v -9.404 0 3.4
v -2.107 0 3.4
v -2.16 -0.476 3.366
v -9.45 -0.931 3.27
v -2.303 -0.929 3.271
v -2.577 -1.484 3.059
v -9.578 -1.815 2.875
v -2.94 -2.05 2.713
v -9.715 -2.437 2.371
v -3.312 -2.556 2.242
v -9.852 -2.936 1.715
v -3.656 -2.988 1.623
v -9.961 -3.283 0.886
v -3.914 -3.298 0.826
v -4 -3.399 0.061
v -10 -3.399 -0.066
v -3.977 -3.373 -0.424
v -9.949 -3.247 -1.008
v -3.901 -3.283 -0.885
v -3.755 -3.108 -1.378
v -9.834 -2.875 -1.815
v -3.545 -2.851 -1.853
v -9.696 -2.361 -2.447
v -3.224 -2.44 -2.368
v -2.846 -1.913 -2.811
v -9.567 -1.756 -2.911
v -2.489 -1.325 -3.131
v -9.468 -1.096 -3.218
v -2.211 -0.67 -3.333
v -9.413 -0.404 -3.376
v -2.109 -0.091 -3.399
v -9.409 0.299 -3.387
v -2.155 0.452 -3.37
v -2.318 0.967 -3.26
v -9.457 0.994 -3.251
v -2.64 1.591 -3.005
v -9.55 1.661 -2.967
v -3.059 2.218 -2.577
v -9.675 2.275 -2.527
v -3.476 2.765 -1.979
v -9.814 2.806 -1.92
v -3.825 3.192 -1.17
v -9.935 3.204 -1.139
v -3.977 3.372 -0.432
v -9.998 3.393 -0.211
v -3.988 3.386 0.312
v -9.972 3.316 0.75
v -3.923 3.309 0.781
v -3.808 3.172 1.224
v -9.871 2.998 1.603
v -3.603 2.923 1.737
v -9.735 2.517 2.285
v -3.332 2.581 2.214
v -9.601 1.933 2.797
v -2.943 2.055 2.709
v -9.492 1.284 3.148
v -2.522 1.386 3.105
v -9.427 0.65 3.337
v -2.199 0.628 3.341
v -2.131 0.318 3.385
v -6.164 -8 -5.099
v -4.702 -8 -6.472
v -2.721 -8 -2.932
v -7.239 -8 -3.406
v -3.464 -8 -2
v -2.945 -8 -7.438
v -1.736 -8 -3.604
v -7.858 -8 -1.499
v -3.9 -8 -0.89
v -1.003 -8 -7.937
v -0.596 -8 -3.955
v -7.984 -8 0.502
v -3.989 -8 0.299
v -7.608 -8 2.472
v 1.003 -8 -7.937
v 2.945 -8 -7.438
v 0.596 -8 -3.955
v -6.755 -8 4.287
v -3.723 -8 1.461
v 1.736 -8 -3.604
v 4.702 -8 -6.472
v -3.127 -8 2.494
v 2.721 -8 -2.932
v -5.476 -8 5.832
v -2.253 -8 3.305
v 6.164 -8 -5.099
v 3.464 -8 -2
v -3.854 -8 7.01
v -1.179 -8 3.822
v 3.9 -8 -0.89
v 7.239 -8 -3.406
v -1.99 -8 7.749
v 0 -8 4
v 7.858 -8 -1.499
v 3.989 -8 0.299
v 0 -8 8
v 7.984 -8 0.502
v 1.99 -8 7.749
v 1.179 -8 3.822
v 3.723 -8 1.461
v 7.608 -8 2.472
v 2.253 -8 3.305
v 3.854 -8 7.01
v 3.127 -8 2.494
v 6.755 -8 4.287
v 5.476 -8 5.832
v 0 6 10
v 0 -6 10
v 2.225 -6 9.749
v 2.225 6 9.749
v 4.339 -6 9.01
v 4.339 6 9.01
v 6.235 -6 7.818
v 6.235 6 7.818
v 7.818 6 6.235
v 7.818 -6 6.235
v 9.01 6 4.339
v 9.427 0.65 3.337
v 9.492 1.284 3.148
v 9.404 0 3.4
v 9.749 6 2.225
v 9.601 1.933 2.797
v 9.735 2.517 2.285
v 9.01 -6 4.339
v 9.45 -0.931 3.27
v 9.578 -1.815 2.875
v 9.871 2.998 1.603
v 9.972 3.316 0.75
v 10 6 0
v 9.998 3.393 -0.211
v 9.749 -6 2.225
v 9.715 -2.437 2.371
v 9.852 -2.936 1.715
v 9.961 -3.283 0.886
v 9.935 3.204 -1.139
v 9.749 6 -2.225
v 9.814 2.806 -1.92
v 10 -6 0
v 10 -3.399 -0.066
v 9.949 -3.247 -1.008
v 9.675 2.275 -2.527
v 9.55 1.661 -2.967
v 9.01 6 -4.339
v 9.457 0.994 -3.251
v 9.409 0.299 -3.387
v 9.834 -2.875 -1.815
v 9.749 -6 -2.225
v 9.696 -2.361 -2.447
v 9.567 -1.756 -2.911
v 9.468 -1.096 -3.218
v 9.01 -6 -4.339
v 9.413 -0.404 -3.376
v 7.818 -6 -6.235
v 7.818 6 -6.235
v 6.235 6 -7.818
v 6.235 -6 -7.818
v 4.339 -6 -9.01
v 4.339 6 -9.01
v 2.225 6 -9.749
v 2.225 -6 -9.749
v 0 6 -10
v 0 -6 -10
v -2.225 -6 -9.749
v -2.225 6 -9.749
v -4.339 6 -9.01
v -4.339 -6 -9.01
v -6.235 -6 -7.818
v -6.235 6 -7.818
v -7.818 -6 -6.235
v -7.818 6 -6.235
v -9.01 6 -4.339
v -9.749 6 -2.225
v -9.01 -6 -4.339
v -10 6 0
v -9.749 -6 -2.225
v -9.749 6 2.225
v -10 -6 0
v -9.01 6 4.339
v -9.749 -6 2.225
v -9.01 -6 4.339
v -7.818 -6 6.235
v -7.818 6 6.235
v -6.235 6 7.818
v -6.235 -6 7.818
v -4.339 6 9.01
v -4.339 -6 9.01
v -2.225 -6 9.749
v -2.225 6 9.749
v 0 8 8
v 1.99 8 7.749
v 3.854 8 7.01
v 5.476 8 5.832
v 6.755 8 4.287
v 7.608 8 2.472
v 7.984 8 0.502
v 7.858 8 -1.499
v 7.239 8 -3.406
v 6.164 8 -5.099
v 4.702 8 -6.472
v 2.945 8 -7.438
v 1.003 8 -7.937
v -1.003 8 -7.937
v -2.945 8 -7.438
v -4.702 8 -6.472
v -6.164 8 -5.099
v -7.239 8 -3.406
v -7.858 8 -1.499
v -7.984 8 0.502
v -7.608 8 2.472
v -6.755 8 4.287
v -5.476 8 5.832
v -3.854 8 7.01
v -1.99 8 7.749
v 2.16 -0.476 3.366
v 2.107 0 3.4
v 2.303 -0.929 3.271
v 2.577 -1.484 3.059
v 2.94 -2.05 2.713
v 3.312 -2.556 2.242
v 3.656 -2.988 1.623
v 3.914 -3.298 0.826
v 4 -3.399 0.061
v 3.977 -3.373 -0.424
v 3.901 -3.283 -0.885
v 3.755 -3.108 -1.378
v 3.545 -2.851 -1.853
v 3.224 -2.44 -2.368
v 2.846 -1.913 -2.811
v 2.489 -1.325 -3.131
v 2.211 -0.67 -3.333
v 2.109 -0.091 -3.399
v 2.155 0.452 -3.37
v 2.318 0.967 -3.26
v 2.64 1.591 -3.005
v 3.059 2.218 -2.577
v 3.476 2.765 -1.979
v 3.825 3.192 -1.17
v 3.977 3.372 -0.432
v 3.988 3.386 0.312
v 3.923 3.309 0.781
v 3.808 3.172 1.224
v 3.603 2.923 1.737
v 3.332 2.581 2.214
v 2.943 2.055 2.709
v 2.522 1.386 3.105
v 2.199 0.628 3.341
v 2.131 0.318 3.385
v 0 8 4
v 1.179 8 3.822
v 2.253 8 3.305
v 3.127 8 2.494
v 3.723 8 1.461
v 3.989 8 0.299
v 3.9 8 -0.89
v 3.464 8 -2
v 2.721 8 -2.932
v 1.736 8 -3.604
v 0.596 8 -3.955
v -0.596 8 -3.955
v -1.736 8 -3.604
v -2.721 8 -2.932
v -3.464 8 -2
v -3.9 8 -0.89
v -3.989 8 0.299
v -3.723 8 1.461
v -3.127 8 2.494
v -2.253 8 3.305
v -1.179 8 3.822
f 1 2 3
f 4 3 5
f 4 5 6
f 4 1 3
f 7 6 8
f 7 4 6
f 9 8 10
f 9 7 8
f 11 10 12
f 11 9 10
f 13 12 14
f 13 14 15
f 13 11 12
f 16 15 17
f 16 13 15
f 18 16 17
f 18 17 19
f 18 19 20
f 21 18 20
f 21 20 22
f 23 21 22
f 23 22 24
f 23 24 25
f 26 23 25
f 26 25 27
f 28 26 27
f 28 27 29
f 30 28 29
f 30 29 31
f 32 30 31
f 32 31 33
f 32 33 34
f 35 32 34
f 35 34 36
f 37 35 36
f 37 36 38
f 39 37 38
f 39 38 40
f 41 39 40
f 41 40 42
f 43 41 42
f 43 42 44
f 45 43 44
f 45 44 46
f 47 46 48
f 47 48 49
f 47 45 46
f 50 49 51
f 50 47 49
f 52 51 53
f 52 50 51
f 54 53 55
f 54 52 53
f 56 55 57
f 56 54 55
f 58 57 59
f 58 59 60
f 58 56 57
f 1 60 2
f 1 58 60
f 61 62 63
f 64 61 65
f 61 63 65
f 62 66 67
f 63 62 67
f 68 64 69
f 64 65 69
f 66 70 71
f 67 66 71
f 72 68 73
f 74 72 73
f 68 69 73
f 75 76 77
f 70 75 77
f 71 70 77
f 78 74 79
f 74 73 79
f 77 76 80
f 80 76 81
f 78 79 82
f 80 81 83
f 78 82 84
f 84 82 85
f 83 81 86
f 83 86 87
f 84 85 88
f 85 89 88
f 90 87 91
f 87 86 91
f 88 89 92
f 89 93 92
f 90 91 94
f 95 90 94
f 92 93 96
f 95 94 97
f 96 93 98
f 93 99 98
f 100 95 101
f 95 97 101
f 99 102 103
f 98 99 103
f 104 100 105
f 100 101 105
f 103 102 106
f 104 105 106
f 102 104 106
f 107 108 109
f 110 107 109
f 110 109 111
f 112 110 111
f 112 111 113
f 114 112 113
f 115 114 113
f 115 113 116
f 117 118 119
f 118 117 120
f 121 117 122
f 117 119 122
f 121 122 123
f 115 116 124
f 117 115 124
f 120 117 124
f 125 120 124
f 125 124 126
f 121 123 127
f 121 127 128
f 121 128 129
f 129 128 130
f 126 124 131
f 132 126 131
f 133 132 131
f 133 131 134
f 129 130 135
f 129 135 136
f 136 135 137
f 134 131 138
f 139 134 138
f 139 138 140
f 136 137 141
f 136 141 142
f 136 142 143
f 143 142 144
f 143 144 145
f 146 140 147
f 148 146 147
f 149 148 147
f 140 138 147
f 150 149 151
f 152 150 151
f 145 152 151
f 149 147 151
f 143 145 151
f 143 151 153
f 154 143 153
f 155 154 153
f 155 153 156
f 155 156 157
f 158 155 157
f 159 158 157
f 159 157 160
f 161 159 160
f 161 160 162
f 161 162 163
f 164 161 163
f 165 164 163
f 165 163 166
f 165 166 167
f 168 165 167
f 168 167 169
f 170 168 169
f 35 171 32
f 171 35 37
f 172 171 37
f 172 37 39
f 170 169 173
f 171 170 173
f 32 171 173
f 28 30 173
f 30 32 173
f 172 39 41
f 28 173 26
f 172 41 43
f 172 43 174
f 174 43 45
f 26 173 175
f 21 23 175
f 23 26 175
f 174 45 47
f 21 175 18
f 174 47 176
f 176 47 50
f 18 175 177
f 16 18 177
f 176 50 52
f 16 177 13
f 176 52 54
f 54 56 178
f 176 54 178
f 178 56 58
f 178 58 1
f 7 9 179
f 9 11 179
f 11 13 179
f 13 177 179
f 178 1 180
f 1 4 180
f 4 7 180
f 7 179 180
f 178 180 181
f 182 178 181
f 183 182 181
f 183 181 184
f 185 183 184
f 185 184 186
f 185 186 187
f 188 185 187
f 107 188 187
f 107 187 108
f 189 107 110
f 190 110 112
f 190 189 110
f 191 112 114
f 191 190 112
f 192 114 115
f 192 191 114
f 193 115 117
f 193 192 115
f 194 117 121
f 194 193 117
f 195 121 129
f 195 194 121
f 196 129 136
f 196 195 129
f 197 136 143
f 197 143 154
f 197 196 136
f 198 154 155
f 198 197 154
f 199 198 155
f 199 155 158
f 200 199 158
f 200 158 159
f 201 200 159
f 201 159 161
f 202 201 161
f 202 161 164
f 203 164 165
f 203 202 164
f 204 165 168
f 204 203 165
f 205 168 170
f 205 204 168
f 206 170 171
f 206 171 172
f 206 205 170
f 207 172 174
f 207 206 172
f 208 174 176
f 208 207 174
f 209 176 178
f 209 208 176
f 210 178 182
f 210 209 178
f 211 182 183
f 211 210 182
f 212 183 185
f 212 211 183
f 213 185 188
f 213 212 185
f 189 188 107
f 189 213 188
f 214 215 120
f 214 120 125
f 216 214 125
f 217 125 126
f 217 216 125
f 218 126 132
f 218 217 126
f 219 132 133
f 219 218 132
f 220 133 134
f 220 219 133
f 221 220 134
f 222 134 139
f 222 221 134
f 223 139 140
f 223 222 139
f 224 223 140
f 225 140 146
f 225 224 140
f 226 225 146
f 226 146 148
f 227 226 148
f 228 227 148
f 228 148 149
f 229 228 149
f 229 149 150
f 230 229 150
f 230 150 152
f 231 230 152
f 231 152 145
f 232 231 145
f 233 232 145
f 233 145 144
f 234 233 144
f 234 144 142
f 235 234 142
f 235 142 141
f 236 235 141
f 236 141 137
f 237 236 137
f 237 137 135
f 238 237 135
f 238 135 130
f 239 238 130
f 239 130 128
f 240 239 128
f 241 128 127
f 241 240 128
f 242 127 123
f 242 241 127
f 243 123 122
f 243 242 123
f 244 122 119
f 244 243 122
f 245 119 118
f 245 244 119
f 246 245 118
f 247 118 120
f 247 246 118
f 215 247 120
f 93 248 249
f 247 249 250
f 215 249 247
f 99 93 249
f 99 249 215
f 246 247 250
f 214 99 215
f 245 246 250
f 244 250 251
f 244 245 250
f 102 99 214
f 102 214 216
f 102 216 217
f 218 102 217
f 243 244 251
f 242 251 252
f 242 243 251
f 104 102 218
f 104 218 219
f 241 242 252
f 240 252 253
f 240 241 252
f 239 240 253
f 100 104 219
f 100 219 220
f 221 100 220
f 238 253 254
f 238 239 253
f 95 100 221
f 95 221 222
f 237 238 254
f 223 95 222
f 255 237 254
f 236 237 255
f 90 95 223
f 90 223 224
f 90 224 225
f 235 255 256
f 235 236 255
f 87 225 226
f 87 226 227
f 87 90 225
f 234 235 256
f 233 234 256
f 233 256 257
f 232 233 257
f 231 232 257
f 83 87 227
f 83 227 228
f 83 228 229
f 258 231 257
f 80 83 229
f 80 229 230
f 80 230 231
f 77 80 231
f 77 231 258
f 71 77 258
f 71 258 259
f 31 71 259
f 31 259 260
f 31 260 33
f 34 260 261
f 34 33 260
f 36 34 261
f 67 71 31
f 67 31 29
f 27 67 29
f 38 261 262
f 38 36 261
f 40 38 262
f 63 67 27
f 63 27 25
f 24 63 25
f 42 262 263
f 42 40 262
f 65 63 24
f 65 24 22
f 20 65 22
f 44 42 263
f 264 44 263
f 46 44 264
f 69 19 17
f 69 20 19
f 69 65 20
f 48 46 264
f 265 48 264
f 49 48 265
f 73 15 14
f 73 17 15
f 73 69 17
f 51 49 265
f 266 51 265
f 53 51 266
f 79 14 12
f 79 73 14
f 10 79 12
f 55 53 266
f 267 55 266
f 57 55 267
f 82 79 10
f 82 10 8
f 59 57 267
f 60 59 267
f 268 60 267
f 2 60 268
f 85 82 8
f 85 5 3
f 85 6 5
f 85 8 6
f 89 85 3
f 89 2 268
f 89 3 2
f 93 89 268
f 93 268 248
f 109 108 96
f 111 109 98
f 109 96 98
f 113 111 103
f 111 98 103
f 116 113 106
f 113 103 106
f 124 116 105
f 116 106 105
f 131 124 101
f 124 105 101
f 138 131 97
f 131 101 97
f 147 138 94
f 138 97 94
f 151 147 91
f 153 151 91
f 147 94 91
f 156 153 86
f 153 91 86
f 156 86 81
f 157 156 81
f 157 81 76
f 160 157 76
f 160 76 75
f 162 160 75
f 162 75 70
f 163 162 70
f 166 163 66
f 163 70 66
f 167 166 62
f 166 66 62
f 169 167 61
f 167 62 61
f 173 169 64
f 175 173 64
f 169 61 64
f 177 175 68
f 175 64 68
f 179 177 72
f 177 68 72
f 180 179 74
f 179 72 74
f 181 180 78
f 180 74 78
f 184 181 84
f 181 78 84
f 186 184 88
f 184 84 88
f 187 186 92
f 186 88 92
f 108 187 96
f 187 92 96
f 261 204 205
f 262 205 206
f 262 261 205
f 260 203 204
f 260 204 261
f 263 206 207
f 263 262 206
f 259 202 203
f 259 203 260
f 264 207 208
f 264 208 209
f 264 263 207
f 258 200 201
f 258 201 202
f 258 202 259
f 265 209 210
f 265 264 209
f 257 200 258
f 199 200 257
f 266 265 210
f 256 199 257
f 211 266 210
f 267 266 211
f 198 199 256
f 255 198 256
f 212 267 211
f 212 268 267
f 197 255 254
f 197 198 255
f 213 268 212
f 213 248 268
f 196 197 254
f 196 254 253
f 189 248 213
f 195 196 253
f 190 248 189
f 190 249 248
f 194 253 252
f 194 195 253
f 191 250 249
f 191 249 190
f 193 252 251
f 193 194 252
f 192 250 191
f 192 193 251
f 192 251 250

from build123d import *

# Parameters (mm, degrees)
BOSS_EXTRUDE1_DEPTH      = 8
BOSS_EXTRUDE1_DEPTH_BACK = 8
SKETCH2_R                = 10
SKETCH2_R_2              = 4
CUT_EXTRUDE1_DEPTH       = 20
CUT_EXTRUDE1_DEPTH_BACK  = 20
SKETCH3_R                = 3.4
CHAMFER1_SIZE            = 2


with BuildPart() as part:
    # Sketch2 → Boss-Extrude1 (new, two sides: drawn at the far end of the back side and taken through both)
    with BuildSketch(Plane(origin=(0, 0, 0), x_dir=(1, 0, 0), z_dir=(0, 1, 0)).offset(-BOSS_EXTRUDE1_DEPTH_BACK)):
        Circle(SKETCH2_R)
        Circle(SKETCH2_R_2, mode=Mode.SUBTRACT)
    extrude(amount=BOSS_EXTRUDE1_DEPTH + BOSS_EXTRUDE1_DEPTH_BACK)

    # Sketch3 → Cut-Extrude1 (cut, two sides: drawn at the far end of the back side and taken through both)
    with BuildSketch(Plane(origin=(0, 0, 0), x_dir=(0, 0, -1), z_dir=(1, 0, 0)).offset(-CUT_EXTRUDE1_DEPTH_BACK)):
        Circle(SKETCH3_R)
    extrude(amount=CUT_EXTRUDE1_DEPTH + CUT_EXTRUDE1_DEPTH_BACK, mode=Mode.SUBTRACT)

    # Chamfer1
    chamfer1_edges = [part.edges().sort_by_distance(p)[0] for p in [
        (-10, -8, 0),
        (-10, 8, 0),
    ]]
    chamfer(chamfer1_edges, length=CHAMFER1_SIZE)


solid = part.part
